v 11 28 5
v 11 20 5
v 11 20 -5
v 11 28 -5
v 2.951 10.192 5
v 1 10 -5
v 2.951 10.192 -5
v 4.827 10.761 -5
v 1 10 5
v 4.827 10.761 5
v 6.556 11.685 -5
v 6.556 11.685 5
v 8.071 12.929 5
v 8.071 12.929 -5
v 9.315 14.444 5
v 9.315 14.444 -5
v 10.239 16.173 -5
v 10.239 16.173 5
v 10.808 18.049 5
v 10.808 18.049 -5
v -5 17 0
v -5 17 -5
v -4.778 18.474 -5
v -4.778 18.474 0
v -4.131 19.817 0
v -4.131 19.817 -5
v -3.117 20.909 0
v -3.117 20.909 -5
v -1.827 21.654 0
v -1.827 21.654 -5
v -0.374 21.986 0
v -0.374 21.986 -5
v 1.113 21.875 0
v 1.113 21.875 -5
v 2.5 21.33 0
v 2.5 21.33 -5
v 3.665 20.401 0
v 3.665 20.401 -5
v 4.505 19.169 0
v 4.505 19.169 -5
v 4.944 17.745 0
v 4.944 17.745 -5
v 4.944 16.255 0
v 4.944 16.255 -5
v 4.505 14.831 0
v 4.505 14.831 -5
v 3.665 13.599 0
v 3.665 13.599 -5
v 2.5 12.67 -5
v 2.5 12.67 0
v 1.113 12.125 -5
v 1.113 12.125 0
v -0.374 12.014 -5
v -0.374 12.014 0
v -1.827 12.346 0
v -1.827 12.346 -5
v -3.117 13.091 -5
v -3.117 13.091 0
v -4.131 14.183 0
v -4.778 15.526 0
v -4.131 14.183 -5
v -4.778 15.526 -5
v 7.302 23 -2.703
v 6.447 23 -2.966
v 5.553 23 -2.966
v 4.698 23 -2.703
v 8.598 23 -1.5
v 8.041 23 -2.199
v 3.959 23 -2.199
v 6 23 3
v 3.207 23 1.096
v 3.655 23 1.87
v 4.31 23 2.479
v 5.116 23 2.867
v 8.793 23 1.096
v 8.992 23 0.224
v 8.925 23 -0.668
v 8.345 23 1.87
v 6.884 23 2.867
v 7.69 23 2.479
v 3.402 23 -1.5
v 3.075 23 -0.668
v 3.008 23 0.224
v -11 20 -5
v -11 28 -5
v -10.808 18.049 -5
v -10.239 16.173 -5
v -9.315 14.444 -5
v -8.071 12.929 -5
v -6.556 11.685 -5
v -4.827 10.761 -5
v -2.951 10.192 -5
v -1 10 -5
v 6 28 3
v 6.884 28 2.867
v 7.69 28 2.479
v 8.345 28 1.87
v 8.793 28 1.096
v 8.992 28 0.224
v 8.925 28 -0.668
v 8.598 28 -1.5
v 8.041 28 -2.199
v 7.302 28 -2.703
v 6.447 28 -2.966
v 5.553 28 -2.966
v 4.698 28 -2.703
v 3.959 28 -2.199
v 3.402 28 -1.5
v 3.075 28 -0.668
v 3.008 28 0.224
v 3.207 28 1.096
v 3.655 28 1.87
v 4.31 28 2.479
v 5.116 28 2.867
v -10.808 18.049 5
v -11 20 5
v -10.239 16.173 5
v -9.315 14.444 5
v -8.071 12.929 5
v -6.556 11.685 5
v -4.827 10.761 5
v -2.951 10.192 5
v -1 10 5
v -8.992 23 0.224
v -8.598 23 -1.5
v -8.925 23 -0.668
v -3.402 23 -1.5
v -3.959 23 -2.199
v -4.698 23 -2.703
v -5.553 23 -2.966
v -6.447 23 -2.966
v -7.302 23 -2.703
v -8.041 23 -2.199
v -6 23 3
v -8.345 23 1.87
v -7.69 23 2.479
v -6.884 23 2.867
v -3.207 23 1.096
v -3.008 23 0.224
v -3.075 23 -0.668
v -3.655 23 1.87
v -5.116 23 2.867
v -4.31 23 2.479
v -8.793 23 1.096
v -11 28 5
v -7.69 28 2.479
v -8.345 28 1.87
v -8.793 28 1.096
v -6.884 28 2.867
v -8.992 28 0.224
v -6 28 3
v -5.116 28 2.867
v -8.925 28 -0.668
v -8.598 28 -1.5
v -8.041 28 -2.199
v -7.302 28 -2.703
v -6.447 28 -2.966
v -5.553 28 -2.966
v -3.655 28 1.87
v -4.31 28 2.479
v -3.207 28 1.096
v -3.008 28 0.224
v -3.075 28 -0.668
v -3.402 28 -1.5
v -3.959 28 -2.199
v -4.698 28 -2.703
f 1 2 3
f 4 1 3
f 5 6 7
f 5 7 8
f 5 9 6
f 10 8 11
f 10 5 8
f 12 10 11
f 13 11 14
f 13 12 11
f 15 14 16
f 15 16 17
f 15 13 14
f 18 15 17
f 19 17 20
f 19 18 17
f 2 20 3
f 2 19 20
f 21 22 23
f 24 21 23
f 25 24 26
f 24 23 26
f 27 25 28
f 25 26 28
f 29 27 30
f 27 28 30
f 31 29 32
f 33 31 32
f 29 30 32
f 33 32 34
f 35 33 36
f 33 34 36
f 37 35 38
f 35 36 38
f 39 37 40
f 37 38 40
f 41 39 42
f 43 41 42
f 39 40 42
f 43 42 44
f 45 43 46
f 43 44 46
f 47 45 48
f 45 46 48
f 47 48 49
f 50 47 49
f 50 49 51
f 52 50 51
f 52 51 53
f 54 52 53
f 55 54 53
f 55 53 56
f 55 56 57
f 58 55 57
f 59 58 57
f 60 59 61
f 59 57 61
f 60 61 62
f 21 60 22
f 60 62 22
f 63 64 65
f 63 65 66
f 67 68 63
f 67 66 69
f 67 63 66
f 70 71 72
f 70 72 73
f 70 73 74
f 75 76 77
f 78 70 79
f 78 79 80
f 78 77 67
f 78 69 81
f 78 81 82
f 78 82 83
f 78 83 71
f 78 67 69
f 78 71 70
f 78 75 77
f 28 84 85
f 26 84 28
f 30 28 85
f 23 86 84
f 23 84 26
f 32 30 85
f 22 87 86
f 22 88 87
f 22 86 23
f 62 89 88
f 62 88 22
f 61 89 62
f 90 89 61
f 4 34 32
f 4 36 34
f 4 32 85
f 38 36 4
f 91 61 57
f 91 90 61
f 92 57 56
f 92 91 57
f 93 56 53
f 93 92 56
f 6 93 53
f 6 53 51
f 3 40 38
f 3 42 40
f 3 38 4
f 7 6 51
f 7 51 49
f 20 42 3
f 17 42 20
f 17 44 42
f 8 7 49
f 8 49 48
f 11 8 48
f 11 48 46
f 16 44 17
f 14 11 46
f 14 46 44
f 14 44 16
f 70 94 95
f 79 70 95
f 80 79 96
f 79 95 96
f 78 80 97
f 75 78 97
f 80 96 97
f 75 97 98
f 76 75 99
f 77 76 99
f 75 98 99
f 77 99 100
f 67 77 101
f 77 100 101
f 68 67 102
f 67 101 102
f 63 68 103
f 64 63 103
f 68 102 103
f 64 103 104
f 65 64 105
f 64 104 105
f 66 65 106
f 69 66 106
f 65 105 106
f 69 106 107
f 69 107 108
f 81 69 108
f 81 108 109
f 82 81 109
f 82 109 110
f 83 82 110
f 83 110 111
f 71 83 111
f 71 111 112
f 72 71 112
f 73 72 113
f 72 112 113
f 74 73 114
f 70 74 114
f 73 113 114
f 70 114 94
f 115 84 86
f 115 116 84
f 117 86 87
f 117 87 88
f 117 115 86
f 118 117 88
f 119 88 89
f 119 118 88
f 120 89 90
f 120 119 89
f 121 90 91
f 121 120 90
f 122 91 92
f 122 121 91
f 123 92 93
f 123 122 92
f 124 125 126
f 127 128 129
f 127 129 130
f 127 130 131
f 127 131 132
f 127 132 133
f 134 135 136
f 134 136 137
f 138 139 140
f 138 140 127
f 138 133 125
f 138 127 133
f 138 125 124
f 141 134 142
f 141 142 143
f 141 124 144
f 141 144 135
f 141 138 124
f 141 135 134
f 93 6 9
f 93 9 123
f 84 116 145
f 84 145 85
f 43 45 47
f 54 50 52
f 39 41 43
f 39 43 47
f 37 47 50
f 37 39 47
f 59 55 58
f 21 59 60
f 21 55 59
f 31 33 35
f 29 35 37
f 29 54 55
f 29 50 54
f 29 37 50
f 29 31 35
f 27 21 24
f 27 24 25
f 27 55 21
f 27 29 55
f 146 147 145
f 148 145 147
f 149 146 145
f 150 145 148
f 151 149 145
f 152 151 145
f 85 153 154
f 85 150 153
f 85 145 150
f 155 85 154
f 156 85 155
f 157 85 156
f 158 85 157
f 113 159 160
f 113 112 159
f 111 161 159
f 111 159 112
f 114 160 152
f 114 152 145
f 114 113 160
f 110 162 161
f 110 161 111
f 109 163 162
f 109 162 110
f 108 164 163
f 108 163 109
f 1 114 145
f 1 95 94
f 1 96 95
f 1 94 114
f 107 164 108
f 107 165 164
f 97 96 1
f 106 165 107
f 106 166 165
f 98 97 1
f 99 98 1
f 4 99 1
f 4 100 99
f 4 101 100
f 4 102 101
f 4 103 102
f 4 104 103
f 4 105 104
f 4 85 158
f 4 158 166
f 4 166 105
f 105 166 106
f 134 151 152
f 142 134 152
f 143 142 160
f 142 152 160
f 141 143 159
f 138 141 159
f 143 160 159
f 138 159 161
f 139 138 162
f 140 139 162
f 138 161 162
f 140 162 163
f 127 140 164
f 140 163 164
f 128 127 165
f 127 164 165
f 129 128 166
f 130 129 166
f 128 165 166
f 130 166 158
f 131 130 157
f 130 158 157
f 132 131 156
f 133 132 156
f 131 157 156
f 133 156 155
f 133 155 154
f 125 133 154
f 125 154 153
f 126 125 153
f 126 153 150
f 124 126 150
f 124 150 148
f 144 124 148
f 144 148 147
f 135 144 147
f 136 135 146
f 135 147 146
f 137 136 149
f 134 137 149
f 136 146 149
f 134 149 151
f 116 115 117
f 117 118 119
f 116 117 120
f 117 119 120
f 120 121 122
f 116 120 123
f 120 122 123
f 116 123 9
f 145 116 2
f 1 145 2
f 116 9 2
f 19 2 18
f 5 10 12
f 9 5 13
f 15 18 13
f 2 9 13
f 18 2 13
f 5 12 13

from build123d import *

# Parameters (mm, degrees)
SKETCH1_W           = 22
SKETCH1_H           = 10
BOSS_EXTRUDE1_DEPTH = 28
SKETCH2_R           = 3
CUT_EXTRUDE2_DEPTH  = 5
SKETCH4_W           = 22
SKETCH4_H           = 10
CUT_EXTRUDE4_DEPTH  = 32.701734968
SKETCH5_R           = 5
CUT_EXTRUDE5_DEPTH  = 5
FILLET2_R           = 10


with BuildPart() as part:
    # Sketch1 → Boss-Extrude1 (new body)
    with BuildSketch(Plane(origin=(0, 0, 0), x_dir=(1, 0, 0), z_dir=(0, 1, 0))):
        Rectangle(SKETCH1_W, SKETCH1_H)
    extrude(amount=BOSS_EXTRUDE1_DEPTH)

    # Sketch2 → Cut-Extrude2 (cut)
    with BuildSketch(Plane(origin=(0, 28, 0), x_dir=(1, 0, 0), z_dir=(0, 1, 0))):
        with Locations(Location((-6, 0, 0), (0, 0, 270))):
            Circle(SKETCH2_R)
        with Locations(Location((6, 0, 0), (0, 0, 270))):
            Circle(SKETCH2_R)
    extrude(amount=-CUT_EXTRUDE2_DEPTH, mode=Mode.SUBTRACT)

    # Sketch4 → Cut-Extrude4 (cut, through all)
    with BuildSketch(Plane(origin=(0, 0, -5), x_dir=(-1, 0, 0), z_dir=(0, 0, -1))):
        with Locations((0, 5)):
            Rectangle(SKETCH4_W, SKETCH4_H)
    extrude(amount=-CUT_EXTRUDE4_DEPTH, mode=Mode.SUBTRACT)

    # Sketch5 → Cut-Extrude5 (cut)
    with BuildSketch(Plane(origin=(0, 0, -5), x_dir=(-1, 0, 0), z_dir=(0, 0, -1))):
        with Locations((0, 17)):
            Circle(SKETCH5_R)
    extrude(amount=-CUT_EXTRUDE5_DEPTH, mode=Mode.SUBTRACT)

    # Fillet2
    fillet2_edges = [part.edges().sort_by_distance(p)[0] for p in [
        (-11, 10, 0),
        (11, 10, 0),
    ]]
    fillet(fillet2_edges, radius=FILLET2_R)


solid = part.part
